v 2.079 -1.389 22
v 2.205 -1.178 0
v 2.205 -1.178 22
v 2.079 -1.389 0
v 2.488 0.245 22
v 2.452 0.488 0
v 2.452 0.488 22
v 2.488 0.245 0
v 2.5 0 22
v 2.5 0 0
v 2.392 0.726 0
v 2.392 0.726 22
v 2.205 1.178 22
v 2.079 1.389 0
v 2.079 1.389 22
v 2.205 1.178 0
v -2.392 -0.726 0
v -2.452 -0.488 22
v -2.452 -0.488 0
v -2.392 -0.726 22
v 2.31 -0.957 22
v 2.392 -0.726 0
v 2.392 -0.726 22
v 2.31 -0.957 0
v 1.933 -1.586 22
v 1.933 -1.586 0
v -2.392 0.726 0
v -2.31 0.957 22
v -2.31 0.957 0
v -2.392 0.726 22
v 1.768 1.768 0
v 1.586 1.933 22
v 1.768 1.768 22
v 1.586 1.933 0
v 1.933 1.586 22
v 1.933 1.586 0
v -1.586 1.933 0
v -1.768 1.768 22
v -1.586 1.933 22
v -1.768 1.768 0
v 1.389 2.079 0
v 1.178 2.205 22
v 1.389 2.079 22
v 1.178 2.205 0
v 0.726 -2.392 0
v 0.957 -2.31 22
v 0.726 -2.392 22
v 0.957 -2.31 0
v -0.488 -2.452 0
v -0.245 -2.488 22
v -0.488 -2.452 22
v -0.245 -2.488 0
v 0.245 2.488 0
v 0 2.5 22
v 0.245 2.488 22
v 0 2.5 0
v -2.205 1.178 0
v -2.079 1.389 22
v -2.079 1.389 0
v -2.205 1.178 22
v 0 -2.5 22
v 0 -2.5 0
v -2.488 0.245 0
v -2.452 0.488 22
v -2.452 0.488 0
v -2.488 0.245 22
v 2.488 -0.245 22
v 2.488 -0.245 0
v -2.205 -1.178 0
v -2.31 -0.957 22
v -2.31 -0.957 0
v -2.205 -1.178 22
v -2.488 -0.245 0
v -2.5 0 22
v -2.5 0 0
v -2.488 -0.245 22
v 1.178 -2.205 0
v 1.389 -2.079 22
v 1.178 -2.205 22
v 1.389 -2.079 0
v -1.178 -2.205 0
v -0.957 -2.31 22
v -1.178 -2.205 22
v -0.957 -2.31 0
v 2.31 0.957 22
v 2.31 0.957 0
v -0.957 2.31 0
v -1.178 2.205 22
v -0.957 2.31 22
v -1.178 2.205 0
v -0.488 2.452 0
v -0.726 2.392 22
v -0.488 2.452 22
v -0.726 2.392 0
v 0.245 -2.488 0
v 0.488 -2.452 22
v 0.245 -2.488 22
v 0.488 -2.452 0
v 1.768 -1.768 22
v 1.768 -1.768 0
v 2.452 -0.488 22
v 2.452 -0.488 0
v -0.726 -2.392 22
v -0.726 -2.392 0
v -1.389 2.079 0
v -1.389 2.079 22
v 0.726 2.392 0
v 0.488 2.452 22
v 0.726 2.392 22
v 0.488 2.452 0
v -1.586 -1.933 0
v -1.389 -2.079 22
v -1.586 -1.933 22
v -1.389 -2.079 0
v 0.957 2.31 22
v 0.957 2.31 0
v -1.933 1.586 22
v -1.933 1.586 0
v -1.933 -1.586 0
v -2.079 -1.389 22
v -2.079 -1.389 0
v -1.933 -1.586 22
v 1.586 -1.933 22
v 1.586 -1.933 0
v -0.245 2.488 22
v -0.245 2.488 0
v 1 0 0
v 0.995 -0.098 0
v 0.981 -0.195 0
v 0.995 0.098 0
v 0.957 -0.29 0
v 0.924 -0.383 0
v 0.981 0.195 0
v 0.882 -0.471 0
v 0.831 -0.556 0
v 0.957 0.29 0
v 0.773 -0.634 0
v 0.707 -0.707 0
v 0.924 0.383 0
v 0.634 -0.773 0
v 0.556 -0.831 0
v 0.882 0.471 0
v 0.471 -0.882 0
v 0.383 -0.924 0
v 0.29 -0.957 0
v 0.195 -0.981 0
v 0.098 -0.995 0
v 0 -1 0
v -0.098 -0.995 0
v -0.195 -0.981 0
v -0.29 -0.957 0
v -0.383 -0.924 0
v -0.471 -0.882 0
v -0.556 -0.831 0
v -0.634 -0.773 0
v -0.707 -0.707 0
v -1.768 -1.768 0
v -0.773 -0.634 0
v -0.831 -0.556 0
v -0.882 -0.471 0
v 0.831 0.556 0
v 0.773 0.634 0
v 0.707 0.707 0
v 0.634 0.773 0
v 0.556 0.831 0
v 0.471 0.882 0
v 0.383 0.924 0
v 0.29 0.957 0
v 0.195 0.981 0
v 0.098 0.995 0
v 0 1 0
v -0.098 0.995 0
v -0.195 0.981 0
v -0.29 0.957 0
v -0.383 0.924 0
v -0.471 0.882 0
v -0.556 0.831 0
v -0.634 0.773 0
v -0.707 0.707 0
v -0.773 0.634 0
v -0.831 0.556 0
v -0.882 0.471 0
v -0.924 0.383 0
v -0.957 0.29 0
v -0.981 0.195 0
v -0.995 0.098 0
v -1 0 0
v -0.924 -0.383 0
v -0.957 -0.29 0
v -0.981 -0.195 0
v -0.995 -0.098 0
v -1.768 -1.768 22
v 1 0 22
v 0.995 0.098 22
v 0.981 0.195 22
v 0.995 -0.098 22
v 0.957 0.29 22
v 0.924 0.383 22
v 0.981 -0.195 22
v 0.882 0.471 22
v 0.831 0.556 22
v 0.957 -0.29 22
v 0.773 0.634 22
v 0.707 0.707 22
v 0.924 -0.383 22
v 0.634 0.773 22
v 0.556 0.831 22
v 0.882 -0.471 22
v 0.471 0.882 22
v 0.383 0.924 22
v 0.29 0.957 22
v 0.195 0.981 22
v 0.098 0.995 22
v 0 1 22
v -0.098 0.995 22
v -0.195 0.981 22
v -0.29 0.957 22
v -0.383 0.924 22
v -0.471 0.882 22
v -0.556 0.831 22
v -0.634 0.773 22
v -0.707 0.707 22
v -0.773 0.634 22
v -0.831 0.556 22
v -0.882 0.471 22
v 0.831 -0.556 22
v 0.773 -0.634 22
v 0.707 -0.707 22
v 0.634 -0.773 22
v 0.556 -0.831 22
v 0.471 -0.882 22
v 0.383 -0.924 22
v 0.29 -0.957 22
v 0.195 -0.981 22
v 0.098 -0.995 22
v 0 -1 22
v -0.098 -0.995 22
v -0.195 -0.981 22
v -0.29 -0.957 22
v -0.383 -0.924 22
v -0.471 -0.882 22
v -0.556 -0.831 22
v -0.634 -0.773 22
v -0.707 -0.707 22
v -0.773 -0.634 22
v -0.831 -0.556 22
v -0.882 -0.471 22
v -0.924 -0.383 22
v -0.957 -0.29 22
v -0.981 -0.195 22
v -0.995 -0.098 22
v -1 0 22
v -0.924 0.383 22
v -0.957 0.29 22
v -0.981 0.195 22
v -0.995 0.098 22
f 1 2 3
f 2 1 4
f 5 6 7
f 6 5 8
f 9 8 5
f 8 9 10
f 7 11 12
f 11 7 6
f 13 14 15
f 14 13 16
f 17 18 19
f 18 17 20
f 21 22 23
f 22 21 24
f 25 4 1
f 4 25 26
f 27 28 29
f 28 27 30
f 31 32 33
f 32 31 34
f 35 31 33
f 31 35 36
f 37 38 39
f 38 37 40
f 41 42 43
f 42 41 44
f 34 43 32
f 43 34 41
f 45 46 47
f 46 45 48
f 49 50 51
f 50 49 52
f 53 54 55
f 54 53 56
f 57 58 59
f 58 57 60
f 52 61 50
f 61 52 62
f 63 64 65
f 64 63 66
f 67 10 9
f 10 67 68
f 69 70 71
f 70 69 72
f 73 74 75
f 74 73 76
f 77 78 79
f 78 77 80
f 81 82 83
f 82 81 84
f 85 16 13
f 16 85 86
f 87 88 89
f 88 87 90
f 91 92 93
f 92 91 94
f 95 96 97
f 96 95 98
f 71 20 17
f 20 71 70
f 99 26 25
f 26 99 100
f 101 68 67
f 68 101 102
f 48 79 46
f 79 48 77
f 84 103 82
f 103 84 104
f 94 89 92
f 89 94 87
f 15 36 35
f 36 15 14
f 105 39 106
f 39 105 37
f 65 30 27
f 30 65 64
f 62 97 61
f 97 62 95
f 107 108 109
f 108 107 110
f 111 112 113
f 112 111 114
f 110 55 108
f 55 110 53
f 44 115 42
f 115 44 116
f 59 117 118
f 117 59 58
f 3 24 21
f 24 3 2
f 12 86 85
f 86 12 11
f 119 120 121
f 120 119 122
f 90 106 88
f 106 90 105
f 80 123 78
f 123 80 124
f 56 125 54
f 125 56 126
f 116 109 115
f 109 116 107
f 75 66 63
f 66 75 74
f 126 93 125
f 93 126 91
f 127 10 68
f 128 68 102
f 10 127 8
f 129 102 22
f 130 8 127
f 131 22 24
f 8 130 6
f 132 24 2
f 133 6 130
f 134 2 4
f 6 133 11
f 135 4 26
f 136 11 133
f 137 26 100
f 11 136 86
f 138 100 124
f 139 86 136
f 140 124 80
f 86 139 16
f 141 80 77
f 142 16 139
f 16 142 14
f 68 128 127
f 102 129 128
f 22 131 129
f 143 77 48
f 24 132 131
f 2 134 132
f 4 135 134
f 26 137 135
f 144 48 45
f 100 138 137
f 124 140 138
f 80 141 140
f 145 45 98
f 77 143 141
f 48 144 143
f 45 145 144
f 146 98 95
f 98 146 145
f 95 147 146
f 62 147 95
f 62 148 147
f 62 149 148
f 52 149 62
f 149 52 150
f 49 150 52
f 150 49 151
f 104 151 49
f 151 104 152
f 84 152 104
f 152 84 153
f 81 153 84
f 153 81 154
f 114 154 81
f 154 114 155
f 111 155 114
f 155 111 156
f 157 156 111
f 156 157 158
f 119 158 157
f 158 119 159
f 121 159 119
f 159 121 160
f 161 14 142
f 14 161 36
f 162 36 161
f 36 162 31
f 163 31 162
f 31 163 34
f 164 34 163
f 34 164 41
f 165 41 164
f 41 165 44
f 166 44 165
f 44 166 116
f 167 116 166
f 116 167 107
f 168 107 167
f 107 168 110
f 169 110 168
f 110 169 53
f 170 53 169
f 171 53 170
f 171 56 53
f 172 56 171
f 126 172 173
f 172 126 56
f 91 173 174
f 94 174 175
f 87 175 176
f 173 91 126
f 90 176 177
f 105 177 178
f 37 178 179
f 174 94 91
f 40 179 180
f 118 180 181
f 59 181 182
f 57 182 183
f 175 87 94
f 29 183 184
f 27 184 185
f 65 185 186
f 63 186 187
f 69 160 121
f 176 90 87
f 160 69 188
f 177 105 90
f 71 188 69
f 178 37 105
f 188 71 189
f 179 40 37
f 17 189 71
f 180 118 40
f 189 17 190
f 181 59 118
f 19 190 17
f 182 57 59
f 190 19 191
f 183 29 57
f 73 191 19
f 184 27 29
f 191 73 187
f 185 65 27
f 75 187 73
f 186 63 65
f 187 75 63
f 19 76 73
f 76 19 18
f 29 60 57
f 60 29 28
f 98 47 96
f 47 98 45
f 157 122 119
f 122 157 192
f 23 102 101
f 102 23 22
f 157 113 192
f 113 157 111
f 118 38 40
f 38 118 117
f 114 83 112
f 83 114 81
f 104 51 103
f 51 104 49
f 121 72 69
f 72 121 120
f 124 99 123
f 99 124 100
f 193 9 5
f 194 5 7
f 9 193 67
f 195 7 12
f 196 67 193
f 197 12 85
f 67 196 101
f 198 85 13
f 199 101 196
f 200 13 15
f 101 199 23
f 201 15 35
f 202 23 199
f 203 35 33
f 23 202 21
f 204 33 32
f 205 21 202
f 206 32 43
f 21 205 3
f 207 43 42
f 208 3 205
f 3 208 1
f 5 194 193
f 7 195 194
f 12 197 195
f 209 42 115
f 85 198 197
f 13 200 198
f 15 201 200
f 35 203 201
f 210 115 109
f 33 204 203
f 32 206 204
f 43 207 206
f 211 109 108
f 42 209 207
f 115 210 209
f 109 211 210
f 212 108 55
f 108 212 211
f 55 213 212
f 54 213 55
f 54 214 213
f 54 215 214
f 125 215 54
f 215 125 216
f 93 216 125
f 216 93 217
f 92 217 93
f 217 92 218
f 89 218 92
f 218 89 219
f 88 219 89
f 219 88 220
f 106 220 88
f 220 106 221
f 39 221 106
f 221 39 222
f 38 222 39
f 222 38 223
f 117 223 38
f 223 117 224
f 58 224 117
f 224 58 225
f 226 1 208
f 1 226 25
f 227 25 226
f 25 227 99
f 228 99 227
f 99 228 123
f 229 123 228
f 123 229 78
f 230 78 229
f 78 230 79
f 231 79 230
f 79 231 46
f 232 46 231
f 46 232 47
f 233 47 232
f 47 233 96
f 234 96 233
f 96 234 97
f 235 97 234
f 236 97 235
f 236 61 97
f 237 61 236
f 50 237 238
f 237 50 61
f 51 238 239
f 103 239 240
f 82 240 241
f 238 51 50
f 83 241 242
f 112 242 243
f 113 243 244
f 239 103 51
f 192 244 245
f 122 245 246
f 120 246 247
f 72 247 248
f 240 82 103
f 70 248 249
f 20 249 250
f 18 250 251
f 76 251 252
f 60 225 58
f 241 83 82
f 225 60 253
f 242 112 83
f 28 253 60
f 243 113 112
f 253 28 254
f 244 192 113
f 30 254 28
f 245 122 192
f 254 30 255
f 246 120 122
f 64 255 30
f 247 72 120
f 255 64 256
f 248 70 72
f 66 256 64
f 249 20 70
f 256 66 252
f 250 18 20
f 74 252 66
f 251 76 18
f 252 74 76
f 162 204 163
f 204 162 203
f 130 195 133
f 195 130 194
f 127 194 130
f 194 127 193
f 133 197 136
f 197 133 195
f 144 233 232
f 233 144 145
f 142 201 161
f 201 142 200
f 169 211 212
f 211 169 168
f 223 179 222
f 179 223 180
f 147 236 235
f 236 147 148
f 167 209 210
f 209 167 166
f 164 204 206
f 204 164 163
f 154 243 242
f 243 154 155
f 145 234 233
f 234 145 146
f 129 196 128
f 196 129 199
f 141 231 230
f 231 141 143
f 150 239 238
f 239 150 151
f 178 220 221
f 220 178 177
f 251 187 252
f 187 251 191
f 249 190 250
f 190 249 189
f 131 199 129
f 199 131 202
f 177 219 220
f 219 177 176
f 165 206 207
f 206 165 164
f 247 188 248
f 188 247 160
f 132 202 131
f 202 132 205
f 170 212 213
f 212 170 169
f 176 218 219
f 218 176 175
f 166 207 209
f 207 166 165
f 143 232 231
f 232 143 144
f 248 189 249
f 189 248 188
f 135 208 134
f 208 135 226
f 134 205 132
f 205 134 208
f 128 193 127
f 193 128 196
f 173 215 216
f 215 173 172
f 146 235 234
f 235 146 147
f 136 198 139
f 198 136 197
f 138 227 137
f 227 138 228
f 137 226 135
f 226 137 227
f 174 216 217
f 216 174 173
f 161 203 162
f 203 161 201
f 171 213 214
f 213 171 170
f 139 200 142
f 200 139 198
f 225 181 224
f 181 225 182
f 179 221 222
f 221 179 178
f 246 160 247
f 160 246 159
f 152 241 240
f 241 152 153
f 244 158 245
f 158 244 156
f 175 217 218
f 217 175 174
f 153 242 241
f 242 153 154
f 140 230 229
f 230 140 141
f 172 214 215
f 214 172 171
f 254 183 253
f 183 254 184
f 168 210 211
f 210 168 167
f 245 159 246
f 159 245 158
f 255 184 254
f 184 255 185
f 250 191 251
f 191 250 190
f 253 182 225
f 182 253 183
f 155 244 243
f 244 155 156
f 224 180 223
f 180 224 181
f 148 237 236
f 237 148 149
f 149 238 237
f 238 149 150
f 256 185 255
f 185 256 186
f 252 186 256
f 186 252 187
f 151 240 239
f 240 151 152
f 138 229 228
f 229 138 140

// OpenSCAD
//
// standoff-5x22(2.0)-2-20260301A.scad
//
// Cylinder with through hole
//

D_outer = 5.0; // 外径 (mm)
L       = 22;  // 長さ (mm)
D_hole  = 2.0; // 穴径 (mm)

$fn = 64;      // 円の滑らかさ

difference() {
    // 外側の円柱
    cylinder(d = D_outer, h = L);

    // 中心に貫通穴
    // 少し長めにして確実に貫通させる
    translate([0, 0, -1])
        cylinder(d = D_hole, h = L + 2);
}
